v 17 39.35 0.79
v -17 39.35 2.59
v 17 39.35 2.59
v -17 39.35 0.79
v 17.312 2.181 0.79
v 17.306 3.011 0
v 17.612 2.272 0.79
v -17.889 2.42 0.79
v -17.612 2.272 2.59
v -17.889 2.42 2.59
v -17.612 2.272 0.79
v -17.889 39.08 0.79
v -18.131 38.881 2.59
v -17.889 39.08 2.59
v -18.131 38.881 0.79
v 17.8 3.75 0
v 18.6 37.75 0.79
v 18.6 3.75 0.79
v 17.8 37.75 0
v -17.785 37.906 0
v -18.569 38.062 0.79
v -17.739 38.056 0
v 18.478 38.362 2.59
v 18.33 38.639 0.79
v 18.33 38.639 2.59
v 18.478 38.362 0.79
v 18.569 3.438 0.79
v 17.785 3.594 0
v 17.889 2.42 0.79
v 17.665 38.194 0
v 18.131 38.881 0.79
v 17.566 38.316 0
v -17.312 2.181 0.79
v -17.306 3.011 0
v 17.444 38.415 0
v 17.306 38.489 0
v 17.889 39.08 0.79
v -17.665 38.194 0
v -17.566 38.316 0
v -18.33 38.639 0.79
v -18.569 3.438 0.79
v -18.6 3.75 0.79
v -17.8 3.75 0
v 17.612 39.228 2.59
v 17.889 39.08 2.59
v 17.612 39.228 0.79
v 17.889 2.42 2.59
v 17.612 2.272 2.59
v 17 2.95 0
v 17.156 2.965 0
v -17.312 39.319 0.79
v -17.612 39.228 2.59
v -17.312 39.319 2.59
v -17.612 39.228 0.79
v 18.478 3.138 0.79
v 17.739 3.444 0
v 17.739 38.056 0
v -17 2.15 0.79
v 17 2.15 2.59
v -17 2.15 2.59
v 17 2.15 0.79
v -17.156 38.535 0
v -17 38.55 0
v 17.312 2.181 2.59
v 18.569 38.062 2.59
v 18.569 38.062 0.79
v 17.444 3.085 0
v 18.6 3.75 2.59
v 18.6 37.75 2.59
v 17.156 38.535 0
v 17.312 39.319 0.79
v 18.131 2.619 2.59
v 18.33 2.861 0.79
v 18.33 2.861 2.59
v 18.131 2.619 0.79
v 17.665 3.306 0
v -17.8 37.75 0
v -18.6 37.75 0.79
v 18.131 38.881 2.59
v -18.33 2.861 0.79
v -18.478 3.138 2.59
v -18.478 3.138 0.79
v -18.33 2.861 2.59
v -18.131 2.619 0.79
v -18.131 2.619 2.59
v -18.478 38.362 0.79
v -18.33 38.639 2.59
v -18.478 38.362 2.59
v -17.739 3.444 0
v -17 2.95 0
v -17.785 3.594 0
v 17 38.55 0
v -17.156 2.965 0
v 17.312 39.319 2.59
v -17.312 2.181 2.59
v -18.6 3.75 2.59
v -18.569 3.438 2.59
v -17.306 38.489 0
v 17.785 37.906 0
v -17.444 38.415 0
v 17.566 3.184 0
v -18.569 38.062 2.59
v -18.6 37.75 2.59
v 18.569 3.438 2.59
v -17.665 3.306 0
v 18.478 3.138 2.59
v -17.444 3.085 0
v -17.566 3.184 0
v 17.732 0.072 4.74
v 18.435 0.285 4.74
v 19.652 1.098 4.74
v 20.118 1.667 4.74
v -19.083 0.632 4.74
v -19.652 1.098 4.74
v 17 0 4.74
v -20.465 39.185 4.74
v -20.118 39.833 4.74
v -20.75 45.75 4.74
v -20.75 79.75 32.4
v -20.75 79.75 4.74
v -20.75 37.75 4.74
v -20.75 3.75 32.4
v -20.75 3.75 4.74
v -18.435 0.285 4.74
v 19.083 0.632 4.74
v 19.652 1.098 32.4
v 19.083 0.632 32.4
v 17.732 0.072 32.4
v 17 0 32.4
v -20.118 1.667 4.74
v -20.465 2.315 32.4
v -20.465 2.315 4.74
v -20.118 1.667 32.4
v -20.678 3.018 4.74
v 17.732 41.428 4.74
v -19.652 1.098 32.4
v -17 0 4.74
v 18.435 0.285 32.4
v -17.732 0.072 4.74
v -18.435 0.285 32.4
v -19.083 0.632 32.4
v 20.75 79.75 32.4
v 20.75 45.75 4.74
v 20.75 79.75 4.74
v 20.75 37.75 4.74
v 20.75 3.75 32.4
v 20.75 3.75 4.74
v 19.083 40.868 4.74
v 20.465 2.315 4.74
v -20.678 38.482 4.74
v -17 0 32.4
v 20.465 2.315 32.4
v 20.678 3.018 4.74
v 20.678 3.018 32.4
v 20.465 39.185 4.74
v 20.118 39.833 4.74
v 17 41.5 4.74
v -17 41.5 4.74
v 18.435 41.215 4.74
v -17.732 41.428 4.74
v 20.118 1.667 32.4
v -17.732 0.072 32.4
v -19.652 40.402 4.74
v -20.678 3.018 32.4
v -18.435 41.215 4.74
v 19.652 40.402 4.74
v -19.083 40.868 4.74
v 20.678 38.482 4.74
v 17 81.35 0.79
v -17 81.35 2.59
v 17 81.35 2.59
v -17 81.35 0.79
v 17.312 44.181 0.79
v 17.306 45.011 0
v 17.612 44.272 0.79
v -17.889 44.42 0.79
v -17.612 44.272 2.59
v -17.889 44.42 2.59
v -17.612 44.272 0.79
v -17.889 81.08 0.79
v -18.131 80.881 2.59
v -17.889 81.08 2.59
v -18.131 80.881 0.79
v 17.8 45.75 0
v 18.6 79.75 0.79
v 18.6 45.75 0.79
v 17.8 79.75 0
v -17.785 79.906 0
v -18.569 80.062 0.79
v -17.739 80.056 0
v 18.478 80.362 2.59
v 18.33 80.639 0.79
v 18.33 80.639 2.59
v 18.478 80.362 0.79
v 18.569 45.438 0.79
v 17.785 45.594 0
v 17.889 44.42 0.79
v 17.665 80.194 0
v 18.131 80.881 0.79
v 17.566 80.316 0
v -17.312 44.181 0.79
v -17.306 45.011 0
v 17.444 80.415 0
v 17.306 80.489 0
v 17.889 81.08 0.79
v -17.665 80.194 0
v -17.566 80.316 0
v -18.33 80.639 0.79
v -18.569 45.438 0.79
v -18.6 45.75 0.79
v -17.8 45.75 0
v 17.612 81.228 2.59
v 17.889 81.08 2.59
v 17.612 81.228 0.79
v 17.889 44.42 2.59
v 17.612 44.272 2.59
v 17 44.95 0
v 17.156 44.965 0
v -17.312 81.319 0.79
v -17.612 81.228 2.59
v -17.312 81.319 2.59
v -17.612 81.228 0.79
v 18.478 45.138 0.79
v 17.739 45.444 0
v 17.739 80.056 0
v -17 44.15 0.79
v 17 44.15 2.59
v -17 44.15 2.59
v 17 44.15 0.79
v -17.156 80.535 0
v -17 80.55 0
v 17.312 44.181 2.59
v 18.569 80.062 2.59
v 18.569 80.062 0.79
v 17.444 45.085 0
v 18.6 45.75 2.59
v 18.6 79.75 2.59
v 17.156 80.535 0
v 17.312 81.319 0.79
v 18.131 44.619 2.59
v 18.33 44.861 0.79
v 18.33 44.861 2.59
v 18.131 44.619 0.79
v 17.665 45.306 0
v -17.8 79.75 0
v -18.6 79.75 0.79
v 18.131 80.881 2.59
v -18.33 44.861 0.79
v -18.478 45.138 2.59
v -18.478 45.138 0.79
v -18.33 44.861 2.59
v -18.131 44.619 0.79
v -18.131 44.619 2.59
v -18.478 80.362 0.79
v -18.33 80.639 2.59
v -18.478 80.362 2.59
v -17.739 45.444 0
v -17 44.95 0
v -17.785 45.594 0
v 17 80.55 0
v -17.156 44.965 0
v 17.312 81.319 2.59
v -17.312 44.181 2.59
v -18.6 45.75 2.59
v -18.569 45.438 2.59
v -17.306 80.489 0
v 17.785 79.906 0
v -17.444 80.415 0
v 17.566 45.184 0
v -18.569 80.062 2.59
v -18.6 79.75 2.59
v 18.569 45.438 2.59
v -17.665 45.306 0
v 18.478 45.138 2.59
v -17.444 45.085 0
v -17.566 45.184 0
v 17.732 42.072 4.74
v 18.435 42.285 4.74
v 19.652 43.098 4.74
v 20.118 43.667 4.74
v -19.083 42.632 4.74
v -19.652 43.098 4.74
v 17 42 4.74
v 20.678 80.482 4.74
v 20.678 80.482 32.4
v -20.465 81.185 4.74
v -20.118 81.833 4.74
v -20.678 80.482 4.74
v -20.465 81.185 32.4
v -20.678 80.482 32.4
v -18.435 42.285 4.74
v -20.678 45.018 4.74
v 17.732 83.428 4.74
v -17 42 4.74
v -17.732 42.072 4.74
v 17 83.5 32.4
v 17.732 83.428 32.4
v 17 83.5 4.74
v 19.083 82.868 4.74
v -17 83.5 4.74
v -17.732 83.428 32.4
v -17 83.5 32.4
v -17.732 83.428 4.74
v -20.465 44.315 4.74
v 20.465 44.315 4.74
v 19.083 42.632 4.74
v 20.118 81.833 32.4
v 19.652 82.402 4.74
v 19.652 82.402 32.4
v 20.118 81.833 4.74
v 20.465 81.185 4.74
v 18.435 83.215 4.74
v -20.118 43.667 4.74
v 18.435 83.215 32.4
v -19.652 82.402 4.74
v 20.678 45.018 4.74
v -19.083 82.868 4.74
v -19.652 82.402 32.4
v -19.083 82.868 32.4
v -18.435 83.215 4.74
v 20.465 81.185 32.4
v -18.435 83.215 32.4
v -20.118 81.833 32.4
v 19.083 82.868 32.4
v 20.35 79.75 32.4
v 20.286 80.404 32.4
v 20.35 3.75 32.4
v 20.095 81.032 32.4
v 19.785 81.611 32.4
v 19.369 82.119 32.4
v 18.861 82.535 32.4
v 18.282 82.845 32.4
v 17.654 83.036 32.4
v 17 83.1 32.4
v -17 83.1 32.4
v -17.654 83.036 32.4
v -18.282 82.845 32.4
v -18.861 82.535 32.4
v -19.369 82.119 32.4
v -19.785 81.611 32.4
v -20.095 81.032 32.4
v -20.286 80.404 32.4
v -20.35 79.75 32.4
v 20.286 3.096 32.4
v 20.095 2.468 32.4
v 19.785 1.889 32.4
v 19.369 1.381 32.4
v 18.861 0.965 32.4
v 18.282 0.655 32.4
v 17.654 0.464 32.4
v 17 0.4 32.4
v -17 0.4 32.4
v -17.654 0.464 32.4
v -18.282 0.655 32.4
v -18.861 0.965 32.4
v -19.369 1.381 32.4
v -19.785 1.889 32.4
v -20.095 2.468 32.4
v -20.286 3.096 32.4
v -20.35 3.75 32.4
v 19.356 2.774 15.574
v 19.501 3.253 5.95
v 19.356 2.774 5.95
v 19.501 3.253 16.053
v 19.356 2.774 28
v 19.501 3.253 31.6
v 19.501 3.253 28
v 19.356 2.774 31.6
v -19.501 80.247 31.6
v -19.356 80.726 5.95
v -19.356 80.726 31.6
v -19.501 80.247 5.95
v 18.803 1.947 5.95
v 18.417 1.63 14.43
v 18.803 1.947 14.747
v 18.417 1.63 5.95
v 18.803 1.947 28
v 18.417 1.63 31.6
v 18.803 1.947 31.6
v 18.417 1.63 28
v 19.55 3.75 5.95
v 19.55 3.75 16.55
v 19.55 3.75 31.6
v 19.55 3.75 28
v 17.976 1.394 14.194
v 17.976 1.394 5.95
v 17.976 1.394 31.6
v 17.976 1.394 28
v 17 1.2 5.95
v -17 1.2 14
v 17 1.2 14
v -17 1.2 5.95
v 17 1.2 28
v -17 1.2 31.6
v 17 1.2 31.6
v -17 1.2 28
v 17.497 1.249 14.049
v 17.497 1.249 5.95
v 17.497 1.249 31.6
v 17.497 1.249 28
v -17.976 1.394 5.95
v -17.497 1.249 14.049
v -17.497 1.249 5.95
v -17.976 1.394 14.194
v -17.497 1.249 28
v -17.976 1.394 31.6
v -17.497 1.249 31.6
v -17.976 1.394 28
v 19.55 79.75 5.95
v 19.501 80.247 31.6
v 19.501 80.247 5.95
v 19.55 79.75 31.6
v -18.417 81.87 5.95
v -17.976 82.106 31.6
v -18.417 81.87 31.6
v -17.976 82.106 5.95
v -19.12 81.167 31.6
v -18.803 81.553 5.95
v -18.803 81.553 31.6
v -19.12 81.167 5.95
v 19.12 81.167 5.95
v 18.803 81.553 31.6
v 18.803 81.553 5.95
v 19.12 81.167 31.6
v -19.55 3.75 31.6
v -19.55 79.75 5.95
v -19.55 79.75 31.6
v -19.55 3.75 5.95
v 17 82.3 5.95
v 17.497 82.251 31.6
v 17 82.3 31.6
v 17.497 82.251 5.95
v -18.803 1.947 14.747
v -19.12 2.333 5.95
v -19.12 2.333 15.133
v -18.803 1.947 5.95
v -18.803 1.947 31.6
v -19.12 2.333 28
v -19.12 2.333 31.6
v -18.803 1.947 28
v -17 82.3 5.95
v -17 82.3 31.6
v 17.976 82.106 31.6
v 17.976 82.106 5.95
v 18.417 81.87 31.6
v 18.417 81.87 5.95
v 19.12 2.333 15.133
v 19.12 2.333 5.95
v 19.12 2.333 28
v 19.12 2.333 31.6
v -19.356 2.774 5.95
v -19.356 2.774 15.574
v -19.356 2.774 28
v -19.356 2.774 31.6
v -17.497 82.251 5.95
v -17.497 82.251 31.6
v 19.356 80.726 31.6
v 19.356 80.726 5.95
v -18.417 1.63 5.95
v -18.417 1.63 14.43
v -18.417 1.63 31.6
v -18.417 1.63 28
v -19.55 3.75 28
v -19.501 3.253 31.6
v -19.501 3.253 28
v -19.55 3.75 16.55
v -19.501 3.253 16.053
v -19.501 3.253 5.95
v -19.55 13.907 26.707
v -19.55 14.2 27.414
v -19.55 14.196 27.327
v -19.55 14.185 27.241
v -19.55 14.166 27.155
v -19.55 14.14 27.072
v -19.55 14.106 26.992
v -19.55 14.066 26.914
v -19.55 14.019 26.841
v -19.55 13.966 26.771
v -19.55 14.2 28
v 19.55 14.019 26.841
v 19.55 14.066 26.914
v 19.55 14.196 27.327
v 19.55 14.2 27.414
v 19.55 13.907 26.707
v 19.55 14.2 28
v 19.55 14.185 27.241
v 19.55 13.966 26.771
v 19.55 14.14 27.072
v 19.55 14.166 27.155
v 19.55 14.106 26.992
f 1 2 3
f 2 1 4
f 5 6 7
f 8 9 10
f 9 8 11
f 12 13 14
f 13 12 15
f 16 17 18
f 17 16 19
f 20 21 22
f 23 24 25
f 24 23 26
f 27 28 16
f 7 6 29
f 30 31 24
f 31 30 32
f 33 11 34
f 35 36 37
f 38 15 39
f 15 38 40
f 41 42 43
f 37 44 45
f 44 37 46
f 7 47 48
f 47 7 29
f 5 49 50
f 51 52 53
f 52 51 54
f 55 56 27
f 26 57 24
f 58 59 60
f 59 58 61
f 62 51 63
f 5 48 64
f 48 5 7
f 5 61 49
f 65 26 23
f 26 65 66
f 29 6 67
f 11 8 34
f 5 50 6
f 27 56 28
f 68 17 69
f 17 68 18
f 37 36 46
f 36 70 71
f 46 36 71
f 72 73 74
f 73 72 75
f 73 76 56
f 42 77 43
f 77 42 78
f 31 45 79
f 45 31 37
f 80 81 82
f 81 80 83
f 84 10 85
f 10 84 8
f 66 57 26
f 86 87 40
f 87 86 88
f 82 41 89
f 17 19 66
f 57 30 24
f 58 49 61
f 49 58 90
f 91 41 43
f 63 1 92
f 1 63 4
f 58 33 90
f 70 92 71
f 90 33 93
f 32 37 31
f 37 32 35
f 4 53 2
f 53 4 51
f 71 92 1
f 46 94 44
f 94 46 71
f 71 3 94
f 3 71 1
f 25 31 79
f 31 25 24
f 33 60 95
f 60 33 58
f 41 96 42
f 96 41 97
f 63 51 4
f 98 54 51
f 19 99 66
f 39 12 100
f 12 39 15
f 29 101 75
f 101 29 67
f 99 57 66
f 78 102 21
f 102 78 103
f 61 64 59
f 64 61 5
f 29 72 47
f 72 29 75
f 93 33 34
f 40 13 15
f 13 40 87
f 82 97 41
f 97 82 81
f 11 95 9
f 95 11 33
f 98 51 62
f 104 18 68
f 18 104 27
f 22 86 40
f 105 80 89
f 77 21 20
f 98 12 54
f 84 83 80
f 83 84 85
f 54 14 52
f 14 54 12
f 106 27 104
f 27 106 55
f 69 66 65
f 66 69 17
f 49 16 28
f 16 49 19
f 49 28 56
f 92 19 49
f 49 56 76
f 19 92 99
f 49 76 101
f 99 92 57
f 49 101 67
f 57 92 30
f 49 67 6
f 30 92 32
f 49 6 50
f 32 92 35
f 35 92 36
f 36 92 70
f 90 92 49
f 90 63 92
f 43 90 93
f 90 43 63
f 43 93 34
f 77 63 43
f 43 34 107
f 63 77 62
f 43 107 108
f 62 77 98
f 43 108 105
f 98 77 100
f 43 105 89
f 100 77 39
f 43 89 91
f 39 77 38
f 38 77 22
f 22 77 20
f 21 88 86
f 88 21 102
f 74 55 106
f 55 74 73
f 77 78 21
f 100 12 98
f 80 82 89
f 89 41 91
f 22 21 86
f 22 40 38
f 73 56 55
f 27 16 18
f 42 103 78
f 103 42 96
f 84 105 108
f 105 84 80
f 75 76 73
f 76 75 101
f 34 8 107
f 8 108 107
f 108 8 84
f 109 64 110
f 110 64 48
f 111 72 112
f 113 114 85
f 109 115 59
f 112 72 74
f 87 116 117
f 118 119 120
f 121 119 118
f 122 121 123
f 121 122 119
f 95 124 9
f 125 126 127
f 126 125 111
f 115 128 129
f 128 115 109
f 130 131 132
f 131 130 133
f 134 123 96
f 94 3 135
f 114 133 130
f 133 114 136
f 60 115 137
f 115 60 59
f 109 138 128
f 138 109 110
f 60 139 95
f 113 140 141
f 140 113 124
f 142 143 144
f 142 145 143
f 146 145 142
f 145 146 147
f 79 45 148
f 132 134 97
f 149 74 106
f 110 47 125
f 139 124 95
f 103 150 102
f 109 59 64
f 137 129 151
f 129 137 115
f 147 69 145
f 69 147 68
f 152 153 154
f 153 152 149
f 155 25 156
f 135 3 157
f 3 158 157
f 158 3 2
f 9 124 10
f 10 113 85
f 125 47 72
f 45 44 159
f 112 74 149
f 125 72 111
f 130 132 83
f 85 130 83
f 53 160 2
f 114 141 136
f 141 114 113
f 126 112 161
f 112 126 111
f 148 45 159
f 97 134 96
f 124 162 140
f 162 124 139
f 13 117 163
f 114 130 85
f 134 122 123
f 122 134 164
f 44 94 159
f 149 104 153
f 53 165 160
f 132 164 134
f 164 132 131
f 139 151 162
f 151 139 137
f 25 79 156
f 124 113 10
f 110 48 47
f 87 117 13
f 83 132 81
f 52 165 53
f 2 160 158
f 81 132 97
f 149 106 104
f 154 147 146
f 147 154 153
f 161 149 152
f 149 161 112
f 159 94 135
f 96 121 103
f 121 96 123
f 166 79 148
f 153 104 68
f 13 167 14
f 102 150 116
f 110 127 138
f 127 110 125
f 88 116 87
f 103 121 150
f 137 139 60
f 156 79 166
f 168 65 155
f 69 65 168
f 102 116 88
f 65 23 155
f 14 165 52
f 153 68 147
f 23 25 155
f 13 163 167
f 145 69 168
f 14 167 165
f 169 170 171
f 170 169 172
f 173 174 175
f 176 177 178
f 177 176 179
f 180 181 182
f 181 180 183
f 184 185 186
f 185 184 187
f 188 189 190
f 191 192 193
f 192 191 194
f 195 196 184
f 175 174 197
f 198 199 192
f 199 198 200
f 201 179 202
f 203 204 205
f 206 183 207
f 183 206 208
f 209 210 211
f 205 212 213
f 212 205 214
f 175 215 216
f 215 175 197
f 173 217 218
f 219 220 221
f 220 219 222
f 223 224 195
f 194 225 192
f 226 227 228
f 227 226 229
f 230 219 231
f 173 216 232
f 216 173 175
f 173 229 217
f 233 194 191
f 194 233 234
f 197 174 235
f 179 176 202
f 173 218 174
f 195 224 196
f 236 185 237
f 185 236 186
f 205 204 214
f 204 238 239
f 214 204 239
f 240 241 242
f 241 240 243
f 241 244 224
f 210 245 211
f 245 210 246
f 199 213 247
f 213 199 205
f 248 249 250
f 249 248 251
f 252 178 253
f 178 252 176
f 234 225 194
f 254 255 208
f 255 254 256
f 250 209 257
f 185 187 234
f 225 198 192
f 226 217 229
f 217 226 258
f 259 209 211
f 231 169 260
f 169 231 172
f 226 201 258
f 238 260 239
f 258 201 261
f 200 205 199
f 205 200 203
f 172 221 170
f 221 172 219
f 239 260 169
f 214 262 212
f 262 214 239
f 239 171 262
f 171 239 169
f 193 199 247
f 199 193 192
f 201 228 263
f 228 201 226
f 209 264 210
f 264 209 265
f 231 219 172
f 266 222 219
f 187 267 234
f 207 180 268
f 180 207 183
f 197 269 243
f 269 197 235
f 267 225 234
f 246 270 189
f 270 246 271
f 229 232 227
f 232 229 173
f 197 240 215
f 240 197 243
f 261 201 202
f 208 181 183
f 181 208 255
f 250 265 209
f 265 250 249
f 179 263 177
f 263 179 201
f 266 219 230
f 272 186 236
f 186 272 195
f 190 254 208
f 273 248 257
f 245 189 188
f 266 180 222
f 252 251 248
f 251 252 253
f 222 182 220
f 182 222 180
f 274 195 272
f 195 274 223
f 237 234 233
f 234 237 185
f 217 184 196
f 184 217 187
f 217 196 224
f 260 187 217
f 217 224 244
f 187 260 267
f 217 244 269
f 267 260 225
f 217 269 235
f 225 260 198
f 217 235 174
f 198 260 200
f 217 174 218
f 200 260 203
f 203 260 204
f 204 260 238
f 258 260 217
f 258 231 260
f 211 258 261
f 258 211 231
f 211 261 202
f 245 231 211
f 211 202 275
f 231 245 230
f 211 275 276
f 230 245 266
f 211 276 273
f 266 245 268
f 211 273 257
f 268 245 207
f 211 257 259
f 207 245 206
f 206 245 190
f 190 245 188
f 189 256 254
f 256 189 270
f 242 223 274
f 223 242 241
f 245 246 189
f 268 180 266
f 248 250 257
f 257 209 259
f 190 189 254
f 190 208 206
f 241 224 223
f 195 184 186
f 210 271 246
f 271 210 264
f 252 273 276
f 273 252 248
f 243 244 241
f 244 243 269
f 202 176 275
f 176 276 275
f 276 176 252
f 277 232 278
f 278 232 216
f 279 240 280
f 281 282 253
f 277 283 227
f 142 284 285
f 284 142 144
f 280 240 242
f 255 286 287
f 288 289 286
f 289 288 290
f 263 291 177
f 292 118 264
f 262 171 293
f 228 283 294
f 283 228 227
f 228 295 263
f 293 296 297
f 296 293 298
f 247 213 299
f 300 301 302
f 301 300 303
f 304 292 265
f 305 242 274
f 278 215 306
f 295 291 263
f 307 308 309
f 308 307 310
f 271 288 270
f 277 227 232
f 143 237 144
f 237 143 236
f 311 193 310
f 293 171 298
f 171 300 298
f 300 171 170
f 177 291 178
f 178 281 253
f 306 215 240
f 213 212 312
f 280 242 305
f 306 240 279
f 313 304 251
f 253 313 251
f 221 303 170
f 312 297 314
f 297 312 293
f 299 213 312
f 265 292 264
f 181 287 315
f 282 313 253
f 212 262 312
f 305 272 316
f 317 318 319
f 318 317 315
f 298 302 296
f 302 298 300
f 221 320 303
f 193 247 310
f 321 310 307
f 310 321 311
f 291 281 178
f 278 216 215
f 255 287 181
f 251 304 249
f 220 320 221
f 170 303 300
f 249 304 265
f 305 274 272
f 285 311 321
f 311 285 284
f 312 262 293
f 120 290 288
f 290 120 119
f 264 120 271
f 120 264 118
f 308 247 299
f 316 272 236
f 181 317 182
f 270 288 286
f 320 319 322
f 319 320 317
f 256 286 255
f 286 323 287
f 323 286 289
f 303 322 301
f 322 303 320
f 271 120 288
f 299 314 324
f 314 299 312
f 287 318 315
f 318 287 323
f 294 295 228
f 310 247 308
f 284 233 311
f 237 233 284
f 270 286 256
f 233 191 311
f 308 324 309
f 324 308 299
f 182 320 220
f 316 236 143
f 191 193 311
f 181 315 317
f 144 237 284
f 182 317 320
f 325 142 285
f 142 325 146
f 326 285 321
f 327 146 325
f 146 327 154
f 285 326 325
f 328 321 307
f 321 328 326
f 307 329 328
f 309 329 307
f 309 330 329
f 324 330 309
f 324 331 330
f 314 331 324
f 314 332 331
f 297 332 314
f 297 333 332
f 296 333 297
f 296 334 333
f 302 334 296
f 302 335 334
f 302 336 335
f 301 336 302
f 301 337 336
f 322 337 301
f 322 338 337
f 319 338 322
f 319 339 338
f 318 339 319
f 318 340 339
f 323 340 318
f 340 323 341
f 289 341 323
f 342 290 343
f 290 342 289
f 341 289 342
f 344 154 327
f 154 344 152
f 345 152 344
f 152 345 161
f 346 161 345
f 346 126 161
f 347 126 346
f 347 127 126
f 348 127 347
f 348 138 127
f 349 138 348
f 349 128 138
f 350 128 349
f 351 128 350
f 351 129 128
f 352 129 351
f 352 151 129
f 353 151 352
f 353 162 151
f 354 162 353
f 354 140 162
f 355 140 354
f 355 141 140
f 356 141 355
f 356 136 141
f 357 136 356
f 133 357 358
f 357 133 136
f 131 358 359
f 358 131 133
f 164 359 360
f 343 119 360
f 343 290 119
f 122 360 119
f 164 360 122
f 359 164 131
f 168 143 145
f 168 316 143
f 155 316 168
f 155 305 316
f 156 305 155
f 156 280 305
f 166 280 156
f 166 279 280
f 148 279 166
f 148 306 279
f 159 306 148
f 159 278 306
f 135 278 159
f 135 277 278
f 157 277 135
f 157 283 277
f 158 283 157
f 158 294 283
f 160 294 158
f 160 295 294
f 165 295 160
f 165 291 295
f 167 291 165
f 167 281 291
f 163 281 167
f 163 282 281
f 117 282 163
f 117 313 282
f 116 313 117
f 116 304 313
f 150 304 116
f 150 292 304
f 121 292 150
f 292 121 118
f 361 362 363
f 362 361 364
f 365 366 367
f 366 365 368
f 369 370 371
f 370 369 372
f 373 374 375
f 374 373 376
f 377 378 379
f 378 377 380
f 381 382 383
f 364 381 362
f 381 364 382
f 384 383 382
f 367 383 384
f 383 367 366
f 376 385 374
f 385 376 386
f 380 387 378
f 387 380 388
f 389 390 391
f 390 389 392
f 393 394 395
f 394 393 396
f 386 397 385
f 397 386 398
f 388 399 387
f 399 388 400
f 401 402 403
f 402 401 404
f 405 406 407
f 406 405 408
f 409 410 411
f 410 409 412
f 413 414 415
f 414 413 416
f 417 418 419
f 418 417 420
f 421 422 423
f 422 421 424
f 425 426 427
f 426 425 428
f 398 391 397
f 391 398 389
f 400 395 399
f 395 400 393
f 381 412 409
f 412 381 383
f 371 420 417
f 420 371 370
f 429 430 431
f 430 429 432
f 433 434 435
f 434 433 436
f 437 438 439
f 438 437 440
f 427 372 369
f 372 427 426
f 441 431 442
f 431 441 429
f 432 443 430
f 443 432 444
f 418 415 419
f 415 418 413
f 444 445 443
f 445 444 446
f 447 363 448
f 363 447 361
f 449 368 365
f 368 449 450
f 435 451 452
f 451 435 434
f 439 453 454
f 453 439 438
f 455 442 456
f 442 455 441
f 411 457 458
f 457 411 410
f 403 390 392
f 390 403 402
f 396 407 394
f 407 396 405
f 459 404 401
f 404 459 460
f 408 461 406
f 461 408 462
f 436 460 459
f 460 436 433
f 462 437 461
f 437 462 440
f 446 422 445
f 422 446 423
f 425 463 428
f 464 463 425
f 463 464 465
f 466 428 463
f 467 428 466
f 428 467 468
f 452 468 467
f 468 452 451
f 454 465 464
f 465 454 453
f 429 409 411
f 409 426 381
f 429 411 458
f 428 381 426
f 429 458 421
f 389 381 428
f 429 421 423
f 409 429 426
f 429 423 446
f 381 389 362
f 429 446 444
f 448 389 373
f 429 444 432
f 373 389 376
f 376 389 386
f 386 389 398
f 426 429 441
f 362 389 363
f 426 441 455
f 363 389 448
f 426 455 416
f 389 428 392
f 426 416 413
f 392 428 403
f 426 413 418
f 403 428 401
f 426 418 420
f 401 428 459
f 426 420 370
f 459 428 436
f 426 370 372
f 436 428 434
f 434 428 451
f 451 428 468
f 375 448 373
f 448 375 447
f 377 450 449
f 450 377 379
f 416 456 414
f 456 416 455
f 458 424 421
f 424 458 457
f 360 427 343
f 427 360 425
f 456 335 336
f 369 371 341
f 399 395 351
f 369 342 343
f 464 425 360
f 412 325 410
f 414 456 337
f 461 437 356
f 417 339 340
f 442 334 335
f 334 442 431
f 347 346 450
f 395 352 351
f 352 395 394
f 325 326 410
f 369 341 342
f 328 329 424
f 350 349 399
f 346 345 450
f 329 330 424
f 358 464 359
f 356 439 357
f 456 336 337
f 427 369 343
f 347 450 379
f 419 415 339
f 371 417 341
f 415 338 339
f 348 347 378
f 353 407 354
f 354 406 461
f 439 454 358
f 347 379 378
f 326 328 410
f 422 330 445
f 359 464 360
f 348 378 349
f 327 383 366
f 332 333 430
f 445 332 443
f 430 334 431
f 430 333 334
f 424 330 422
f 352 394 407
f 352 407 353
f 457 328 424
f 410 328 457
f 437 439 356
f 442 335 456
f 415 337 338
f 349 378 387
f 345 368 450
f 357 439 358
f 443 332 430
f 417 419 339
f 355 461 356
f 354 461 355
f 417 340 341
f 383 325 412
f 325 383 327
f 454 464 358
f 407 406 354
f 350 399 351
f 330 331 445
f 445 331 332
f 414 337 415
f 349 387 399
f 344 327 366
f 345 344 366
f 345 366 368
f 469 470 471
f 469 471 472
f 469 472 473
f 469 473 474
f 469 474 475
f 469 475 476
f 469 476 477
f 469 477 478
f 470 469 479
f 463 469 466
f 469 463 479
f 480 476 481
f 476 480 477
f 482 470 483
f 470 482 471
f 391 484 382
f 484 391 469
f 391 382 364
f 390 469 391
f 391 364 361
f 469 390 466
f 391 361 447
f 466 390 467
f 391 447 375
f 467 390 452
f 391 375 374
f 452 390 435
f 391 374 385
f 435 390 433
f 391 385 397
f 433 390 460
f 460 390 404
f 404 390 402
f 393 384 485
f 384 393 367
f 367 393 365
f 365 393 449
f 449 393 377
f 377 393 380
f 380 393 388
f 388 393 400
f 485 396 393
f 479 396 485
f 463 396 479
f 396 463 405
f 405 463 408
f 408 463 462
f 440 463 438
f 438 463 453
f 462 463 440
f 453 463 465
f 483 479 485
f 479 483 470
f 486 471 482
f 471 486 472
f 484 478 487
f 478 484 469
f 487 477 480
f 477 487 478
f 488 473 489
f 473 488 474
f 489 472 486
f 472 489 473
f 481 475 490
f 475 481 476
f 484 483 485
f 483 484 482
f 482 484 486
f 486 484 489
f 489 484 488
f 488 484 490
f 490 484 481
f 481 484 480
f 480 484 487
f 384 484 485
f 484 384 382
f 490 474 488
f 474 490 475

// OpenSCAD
// file: ../../../modules/gridfinity.scad
// Gridfinity ベースプレートの共有 module。
// 寸法は Gridfinity 仕様 (Zack Freedman) の baseplate 輪郭に従う:
//   ピッチ 42、ソケット上端開口 41.5 (角 R4)、上から 45° 面取り 2.15 →
//   垂直 1.8 (37.2 角・R1.85) → 45° 面取り 0.7 → 底 35.8 角 (R1.15)。
//   ソケット深さ = 2.15 + 1.8 + 0.7 = 4.65。
//
// 座標系: X が列方向 (中央が 0)、Y が行方向 (板の前端が 0)、Z=0 が板の底面。
// 板の外形は grid とは独立に rim で与えるので、grid より大きい板 (縁付き) を
// 作れる。ソケットは rim=[left, right, front, back] の内側へ 42 ピッチで並ぶ。

gf_pitch = 42;
gf_socket_top = 41.5; // 上端開口
gf_socket_mid = 37.2; // 垂直部
gf_socket_bot = 35.8; // 底
gf_socket_r_top = 4;
gf_socket_r_mid = 1.85;
gf_socket_r_bot = 1.15;
gf_chamfer_top = 2.15;
gf_wall_h = 1.8;
gf_chamfer_bot = 0.7;
gf_socket_depth = gf_chamfer_top + gf_wall_h + gf_chamfer_bot; // 4.65
gf_fn = 32;
gf_eps = 0.01; // hull 用の薄板の厚さ
gf_over = 0.5; // 切削の抜き代

// 角丸正方形または矩形 (w は一辺、または [幅, 奥行き]、角 R)
module
gf_rounded_square(w, r)
{
    offset(r = r, $fn = gf_fn)
        square(is_list(w) ? w - [ 2 * r, 2 * r ] : w - 2 * r, center = true);
}

// 厚さ gf_eps の角丸正方形の薄板を z に置く (hull の骨)
module
gf_slab(w, r, z)
{
    translate([ 0, 0, z ]) linear_extrude(gf_eps) gf_rounded_square(w, r);
}

// ソケット1個の切削体。z=0 がソケットの底 (床の天面)、+Z へ 4.65 で天面に出る。
// clearance は嵌合の逃げで、輪郭を全周へ clearance だけ外へ出す (幅 +2c、角 R
// +c)。pitch_x は X 方向のセル幅。端数でも角 R と面取りの寸法を保つ。
module
gf_socket_cut(clearance = 0, pitch_x = gf_pitch)
{
    z1 = gf_chamfer_bot;
    z2 = z1 + gf_wall_h;
    z3 = gf_socket_depth;
    c = clearance;
    assert(pitch_x > gf_pitch - gf_socket_top + 2 * gf_socket_r_top,
           "Cell width is too small for the socket corner radius");
    delta = [ pitch_x - gf_pitch, 0 ];
    bot = [ gf_socket_bot + 2 * c, gf_socket_bot + 2 * c ] + delta;
    mid = [ gf_socket_mid + 2 * c, gf_socket_mid + 2 * c ] + delta;
    top = [ gf_socket_top + 2 * c, gf_socket_top + 2 * c ] + delta;
    hull()
    {
        gf_slab(bot, gf_socket_r_bot + c, 0);
        gf_slab(mid, gf_socket_r_mid + c, z1 - gf_eps);
    }
    hull()
    {
        gf_slab(mid, gf_socket_r_mid + c, z1 - gf_eps);
        gf_slab(mid, gf_socket_r_mid + c, z2 - gf_eps);
    }
    hull()
    {
        gf_slab(mid, gf_socket_r_mid + c, z2 - gf_eps);
        gf_slab(top, gf_socket_r_top + c, z3 - gf_eps);
    }
    // 天面より上へ抜く (天面と同一平面の退化した面を残さない)
    gf_slab(top, gf_socket_r_top + c, z3 - gf_eps);
    translate([ 0, 0, z3 - gf_eps ]) linear_extrude(gf_over + gf_eps)
        gf_rounded_square(top, gf_socket_r_top + c);
}

// ベースプレート。cols x rows のソケットを床 floor_t の上に彫る。
// rim = [left, right, front, back] はソケット列の外側に残す縁の幅。
// 板の幅 = cols*42 + left + right、奥行き = rows*42 + front + back。
// cols の端数は左端の細幅セルになる。rows は正の整数。
// clearance はソケットの嵌合の逃げ (gf_socket_cut を参照)。
module
gf_baseplate(cols, rows, rim = [ 0, 0, 0, 0 ], floor_t = 1, clearance = 0)
{
    grid_w = cols * gf_pitch;
    grid_d = rows * gf_pitch;
    plate_w = grid_w + rim[0] + rim[1];
    plate_d = grid_d + rim[2] + rim[3];
    x0 = -plate_w / 2 + rim[0]; // ソケット列の左端
    first_pitch = grid_w - (ceil(cols) - 1) * gf_pitch;
    difference()
    {
        translate([ -plate_w / 2, 0, 0 ])
            cube([ plate_w, plate_d, floor_t + gf_socket_depth ]);
        for (c = [0:ceil(cols) - 1], r = [0:rows - 1])
            translate([
                x0 + (c == 0 ? first_pitch / 2
                             : first_pitch + (c - 0.5) * gf_pitch),
                rim[2] + (r + 0.5) * gf_pitch,
                floor_t
            ]) gf_socket_cut(clearance, c == 0 ? first_pitch : gf_pitch);
    }
}
// file: ../../../modules/gridfinity_bins.scad
include <gridfinity_bin.scad>

// assets/gridfinity-bin/ の bin 群の共通値と、サイズ 3 引数の払い出し口。
// 単体では何も描かない。設計の経緯と確定値は
// ledger/designs/gridfinity-bin-4u.md が正本。
// 通常binは4U/9U、X={1,1.5,2,2.5,3} × Y={1,2,3,4,5,5.5}。
// 両軸に端数を持つ組み合わせはassetに置かない（各高さ28種）。
// Xが横、Yがラベルの壁から奥、unitsが高さ（7mm単位）。
wall = 1.2;    // 0.4 ノズル 3 本
floor_t = 1.2; // 底 (4.75) の上に載せる床。床の天面 z = 5.95
label_d = 13;  // 12mm 幅のラベルシールを貼る天板の張り出し
label_t = 1; // 天板の厚さ (user 指定)。下は 45° の無垢のくさび
label_r = 1; // 天板の先端と 45° 面の境目の R (user 指定)
// カードケース (goods/card_case_2x3x4u.scad) の値。カードは ISO/IEC 7810 ID-1 (85.6 × 54 ×
// 0.76、隅 R3) で、長辺を Y (rows 方向) に寝かせ、X 中央・手前の壁から 10 奥に置く。ポケットは
// カードより 1 大きい (片側 0.5)。右奥のマスは壁の内面まで抜き、床と底を外形に平行な 45° の窪みにする。
// ポケットの左右の埋めの天面 (幅 13.05) が 12mm のラベルを貼る帯。ポケットと穴の交点の
// 縦エッジは丸める (開口の上縁は丸めない: 壁を上端まで垂直に保ち、収まる枚数を減らさない)
card_w = 54;    // カードの短辺 (X)。user 指定「高さ 54」
card_d = 85.6;  // カードの長辺 (Y)。user 指定「幅 85.6」
card_clear = 1; // ポケットの余裕 (user 指定「+1mm」)
// ポケットの手前の辺の、手前の壁の内面からの距離 (user 指定「10mm」)
card_off = 10;
// ポケットの平面の隅 R (user 指定「角の丸み 3mm」。ID-1 の隅は 2.88..3.48)
card_r = 3;
// ポケットと穴が交わる所の、埋めの凸の縦エッジの R (指の当たる角)
card_edge_r = 2;
recess_skin = floor_t + 1.75; // 窪みの床 z (底の皮)。user 指定「壁厚と同じ 1.2 は過剰、1.75 返す」

function bin_contract(cols, rows, units) = str("CONTRACT units=",
                                               units,
                                               " pitch=",
                                               gf_pitch,
                                               " outer=",
                                               gfb_outer,
                                               " h=",
                                               units* gfb_unit,
                                               " lip=",
                                               gfb_lip_h,
                                               " base=",
                                               gfb_base_bot,
                                               "/",
                                               gfb_base_mid,
                                               "/",
                                               gfb_outer,
                                               " base_h=",
                                               gfb_base_h,
                                               " wall=",
                                               wall,
                                               " floor_top=",
                                               gfb_base_h + floor_t,
                                               " label=",
                                               label_d,
                                               "x",
                                               label_t,
                                               " wedge=45 fillet=",
                                               label_r,
                                               " bin=",
                                               cols,
                                               "x",
                                               rows,
                                               " size=",
                                               cols* gf_pitch - 0.5,
                                               "x",
                                               rows* gf_pitch - 0.5);

// (cols, rows, units) でラベル付き bin を払い出す。例: gridfinity_bin(2, 4, 4)
module
gridfinity_bin(cols, rows, units = 4)
{
    echo(bin_contract(cols, rows, units));
    gfb_bin(cols, rows, units, wall, floor_t, label_d, label_t, label_r);
}

function card_contract(cols, rows, units) = str("CONTRACT card units=",
                                                units,
                                                " bin=",
                                                cols,
                                                "x",
                                                rows,
                                                " size=",
                                                cols* gf_pitch - 0.5,
                                                "x",
                                                rows* gf_pitch - 0.5,
                                                " h=",
                                                units* gfb_unit,
                                                " lip=",
                                                gfb_lip_h,
                                                " floor_top=",
                                                gfb_base_h + floor_t,
                                                " card=",
                                                card_w,
                                                "x",
                                                card_d,
                                                " pocket=",
                                                card_w + card_clear,
                                                "x",
                                                card_d + card_clear,
                                                " at=",
                                                -(card_w + card_clear) / 2,
                                                ",",
                                                wall + card_off,
                                                " hole=",
                                                (cols - 1) / 2 * gf_pitch - gfb_outer / 2,
                                                ",",
                                                (rows - 0.5) * gf_pitch - 0.25 - gfb_outer / 2,
                                                " hole_r=",
                                                gfb_outer_r - wall,
                                                " recess=",
                                                gfb_outer - 2 * wall,
                                                "/",
                                                gfb_base_mid - 2 * wall,
                                                " recess_floor=",
                                                recess_skin,
                                                " r=",
                                                card_r,
                                                " edge_r=",
                                                card_edge_r);

// (cols, rows, units) でカードケースを払い出す。例: gridfinity_card_case(2, 3, 4)
module
gridfinity_card_case(cols, rows, units = 4)
{
    echo(card_contract(cols, rows, units));
    gfb_card_case(cols,
                  rows,
                  units,
                  wall,
                  floor_t,
                  [ card_w, card_d ],
                  card_clear,
                  card_off,
                  card_r,
                  recess_skin,
                  card_edge_r);
}
// main file
include <../../../modules/gridfinity_bins.scad>

gridfinity_bin(1, 2, 4);
